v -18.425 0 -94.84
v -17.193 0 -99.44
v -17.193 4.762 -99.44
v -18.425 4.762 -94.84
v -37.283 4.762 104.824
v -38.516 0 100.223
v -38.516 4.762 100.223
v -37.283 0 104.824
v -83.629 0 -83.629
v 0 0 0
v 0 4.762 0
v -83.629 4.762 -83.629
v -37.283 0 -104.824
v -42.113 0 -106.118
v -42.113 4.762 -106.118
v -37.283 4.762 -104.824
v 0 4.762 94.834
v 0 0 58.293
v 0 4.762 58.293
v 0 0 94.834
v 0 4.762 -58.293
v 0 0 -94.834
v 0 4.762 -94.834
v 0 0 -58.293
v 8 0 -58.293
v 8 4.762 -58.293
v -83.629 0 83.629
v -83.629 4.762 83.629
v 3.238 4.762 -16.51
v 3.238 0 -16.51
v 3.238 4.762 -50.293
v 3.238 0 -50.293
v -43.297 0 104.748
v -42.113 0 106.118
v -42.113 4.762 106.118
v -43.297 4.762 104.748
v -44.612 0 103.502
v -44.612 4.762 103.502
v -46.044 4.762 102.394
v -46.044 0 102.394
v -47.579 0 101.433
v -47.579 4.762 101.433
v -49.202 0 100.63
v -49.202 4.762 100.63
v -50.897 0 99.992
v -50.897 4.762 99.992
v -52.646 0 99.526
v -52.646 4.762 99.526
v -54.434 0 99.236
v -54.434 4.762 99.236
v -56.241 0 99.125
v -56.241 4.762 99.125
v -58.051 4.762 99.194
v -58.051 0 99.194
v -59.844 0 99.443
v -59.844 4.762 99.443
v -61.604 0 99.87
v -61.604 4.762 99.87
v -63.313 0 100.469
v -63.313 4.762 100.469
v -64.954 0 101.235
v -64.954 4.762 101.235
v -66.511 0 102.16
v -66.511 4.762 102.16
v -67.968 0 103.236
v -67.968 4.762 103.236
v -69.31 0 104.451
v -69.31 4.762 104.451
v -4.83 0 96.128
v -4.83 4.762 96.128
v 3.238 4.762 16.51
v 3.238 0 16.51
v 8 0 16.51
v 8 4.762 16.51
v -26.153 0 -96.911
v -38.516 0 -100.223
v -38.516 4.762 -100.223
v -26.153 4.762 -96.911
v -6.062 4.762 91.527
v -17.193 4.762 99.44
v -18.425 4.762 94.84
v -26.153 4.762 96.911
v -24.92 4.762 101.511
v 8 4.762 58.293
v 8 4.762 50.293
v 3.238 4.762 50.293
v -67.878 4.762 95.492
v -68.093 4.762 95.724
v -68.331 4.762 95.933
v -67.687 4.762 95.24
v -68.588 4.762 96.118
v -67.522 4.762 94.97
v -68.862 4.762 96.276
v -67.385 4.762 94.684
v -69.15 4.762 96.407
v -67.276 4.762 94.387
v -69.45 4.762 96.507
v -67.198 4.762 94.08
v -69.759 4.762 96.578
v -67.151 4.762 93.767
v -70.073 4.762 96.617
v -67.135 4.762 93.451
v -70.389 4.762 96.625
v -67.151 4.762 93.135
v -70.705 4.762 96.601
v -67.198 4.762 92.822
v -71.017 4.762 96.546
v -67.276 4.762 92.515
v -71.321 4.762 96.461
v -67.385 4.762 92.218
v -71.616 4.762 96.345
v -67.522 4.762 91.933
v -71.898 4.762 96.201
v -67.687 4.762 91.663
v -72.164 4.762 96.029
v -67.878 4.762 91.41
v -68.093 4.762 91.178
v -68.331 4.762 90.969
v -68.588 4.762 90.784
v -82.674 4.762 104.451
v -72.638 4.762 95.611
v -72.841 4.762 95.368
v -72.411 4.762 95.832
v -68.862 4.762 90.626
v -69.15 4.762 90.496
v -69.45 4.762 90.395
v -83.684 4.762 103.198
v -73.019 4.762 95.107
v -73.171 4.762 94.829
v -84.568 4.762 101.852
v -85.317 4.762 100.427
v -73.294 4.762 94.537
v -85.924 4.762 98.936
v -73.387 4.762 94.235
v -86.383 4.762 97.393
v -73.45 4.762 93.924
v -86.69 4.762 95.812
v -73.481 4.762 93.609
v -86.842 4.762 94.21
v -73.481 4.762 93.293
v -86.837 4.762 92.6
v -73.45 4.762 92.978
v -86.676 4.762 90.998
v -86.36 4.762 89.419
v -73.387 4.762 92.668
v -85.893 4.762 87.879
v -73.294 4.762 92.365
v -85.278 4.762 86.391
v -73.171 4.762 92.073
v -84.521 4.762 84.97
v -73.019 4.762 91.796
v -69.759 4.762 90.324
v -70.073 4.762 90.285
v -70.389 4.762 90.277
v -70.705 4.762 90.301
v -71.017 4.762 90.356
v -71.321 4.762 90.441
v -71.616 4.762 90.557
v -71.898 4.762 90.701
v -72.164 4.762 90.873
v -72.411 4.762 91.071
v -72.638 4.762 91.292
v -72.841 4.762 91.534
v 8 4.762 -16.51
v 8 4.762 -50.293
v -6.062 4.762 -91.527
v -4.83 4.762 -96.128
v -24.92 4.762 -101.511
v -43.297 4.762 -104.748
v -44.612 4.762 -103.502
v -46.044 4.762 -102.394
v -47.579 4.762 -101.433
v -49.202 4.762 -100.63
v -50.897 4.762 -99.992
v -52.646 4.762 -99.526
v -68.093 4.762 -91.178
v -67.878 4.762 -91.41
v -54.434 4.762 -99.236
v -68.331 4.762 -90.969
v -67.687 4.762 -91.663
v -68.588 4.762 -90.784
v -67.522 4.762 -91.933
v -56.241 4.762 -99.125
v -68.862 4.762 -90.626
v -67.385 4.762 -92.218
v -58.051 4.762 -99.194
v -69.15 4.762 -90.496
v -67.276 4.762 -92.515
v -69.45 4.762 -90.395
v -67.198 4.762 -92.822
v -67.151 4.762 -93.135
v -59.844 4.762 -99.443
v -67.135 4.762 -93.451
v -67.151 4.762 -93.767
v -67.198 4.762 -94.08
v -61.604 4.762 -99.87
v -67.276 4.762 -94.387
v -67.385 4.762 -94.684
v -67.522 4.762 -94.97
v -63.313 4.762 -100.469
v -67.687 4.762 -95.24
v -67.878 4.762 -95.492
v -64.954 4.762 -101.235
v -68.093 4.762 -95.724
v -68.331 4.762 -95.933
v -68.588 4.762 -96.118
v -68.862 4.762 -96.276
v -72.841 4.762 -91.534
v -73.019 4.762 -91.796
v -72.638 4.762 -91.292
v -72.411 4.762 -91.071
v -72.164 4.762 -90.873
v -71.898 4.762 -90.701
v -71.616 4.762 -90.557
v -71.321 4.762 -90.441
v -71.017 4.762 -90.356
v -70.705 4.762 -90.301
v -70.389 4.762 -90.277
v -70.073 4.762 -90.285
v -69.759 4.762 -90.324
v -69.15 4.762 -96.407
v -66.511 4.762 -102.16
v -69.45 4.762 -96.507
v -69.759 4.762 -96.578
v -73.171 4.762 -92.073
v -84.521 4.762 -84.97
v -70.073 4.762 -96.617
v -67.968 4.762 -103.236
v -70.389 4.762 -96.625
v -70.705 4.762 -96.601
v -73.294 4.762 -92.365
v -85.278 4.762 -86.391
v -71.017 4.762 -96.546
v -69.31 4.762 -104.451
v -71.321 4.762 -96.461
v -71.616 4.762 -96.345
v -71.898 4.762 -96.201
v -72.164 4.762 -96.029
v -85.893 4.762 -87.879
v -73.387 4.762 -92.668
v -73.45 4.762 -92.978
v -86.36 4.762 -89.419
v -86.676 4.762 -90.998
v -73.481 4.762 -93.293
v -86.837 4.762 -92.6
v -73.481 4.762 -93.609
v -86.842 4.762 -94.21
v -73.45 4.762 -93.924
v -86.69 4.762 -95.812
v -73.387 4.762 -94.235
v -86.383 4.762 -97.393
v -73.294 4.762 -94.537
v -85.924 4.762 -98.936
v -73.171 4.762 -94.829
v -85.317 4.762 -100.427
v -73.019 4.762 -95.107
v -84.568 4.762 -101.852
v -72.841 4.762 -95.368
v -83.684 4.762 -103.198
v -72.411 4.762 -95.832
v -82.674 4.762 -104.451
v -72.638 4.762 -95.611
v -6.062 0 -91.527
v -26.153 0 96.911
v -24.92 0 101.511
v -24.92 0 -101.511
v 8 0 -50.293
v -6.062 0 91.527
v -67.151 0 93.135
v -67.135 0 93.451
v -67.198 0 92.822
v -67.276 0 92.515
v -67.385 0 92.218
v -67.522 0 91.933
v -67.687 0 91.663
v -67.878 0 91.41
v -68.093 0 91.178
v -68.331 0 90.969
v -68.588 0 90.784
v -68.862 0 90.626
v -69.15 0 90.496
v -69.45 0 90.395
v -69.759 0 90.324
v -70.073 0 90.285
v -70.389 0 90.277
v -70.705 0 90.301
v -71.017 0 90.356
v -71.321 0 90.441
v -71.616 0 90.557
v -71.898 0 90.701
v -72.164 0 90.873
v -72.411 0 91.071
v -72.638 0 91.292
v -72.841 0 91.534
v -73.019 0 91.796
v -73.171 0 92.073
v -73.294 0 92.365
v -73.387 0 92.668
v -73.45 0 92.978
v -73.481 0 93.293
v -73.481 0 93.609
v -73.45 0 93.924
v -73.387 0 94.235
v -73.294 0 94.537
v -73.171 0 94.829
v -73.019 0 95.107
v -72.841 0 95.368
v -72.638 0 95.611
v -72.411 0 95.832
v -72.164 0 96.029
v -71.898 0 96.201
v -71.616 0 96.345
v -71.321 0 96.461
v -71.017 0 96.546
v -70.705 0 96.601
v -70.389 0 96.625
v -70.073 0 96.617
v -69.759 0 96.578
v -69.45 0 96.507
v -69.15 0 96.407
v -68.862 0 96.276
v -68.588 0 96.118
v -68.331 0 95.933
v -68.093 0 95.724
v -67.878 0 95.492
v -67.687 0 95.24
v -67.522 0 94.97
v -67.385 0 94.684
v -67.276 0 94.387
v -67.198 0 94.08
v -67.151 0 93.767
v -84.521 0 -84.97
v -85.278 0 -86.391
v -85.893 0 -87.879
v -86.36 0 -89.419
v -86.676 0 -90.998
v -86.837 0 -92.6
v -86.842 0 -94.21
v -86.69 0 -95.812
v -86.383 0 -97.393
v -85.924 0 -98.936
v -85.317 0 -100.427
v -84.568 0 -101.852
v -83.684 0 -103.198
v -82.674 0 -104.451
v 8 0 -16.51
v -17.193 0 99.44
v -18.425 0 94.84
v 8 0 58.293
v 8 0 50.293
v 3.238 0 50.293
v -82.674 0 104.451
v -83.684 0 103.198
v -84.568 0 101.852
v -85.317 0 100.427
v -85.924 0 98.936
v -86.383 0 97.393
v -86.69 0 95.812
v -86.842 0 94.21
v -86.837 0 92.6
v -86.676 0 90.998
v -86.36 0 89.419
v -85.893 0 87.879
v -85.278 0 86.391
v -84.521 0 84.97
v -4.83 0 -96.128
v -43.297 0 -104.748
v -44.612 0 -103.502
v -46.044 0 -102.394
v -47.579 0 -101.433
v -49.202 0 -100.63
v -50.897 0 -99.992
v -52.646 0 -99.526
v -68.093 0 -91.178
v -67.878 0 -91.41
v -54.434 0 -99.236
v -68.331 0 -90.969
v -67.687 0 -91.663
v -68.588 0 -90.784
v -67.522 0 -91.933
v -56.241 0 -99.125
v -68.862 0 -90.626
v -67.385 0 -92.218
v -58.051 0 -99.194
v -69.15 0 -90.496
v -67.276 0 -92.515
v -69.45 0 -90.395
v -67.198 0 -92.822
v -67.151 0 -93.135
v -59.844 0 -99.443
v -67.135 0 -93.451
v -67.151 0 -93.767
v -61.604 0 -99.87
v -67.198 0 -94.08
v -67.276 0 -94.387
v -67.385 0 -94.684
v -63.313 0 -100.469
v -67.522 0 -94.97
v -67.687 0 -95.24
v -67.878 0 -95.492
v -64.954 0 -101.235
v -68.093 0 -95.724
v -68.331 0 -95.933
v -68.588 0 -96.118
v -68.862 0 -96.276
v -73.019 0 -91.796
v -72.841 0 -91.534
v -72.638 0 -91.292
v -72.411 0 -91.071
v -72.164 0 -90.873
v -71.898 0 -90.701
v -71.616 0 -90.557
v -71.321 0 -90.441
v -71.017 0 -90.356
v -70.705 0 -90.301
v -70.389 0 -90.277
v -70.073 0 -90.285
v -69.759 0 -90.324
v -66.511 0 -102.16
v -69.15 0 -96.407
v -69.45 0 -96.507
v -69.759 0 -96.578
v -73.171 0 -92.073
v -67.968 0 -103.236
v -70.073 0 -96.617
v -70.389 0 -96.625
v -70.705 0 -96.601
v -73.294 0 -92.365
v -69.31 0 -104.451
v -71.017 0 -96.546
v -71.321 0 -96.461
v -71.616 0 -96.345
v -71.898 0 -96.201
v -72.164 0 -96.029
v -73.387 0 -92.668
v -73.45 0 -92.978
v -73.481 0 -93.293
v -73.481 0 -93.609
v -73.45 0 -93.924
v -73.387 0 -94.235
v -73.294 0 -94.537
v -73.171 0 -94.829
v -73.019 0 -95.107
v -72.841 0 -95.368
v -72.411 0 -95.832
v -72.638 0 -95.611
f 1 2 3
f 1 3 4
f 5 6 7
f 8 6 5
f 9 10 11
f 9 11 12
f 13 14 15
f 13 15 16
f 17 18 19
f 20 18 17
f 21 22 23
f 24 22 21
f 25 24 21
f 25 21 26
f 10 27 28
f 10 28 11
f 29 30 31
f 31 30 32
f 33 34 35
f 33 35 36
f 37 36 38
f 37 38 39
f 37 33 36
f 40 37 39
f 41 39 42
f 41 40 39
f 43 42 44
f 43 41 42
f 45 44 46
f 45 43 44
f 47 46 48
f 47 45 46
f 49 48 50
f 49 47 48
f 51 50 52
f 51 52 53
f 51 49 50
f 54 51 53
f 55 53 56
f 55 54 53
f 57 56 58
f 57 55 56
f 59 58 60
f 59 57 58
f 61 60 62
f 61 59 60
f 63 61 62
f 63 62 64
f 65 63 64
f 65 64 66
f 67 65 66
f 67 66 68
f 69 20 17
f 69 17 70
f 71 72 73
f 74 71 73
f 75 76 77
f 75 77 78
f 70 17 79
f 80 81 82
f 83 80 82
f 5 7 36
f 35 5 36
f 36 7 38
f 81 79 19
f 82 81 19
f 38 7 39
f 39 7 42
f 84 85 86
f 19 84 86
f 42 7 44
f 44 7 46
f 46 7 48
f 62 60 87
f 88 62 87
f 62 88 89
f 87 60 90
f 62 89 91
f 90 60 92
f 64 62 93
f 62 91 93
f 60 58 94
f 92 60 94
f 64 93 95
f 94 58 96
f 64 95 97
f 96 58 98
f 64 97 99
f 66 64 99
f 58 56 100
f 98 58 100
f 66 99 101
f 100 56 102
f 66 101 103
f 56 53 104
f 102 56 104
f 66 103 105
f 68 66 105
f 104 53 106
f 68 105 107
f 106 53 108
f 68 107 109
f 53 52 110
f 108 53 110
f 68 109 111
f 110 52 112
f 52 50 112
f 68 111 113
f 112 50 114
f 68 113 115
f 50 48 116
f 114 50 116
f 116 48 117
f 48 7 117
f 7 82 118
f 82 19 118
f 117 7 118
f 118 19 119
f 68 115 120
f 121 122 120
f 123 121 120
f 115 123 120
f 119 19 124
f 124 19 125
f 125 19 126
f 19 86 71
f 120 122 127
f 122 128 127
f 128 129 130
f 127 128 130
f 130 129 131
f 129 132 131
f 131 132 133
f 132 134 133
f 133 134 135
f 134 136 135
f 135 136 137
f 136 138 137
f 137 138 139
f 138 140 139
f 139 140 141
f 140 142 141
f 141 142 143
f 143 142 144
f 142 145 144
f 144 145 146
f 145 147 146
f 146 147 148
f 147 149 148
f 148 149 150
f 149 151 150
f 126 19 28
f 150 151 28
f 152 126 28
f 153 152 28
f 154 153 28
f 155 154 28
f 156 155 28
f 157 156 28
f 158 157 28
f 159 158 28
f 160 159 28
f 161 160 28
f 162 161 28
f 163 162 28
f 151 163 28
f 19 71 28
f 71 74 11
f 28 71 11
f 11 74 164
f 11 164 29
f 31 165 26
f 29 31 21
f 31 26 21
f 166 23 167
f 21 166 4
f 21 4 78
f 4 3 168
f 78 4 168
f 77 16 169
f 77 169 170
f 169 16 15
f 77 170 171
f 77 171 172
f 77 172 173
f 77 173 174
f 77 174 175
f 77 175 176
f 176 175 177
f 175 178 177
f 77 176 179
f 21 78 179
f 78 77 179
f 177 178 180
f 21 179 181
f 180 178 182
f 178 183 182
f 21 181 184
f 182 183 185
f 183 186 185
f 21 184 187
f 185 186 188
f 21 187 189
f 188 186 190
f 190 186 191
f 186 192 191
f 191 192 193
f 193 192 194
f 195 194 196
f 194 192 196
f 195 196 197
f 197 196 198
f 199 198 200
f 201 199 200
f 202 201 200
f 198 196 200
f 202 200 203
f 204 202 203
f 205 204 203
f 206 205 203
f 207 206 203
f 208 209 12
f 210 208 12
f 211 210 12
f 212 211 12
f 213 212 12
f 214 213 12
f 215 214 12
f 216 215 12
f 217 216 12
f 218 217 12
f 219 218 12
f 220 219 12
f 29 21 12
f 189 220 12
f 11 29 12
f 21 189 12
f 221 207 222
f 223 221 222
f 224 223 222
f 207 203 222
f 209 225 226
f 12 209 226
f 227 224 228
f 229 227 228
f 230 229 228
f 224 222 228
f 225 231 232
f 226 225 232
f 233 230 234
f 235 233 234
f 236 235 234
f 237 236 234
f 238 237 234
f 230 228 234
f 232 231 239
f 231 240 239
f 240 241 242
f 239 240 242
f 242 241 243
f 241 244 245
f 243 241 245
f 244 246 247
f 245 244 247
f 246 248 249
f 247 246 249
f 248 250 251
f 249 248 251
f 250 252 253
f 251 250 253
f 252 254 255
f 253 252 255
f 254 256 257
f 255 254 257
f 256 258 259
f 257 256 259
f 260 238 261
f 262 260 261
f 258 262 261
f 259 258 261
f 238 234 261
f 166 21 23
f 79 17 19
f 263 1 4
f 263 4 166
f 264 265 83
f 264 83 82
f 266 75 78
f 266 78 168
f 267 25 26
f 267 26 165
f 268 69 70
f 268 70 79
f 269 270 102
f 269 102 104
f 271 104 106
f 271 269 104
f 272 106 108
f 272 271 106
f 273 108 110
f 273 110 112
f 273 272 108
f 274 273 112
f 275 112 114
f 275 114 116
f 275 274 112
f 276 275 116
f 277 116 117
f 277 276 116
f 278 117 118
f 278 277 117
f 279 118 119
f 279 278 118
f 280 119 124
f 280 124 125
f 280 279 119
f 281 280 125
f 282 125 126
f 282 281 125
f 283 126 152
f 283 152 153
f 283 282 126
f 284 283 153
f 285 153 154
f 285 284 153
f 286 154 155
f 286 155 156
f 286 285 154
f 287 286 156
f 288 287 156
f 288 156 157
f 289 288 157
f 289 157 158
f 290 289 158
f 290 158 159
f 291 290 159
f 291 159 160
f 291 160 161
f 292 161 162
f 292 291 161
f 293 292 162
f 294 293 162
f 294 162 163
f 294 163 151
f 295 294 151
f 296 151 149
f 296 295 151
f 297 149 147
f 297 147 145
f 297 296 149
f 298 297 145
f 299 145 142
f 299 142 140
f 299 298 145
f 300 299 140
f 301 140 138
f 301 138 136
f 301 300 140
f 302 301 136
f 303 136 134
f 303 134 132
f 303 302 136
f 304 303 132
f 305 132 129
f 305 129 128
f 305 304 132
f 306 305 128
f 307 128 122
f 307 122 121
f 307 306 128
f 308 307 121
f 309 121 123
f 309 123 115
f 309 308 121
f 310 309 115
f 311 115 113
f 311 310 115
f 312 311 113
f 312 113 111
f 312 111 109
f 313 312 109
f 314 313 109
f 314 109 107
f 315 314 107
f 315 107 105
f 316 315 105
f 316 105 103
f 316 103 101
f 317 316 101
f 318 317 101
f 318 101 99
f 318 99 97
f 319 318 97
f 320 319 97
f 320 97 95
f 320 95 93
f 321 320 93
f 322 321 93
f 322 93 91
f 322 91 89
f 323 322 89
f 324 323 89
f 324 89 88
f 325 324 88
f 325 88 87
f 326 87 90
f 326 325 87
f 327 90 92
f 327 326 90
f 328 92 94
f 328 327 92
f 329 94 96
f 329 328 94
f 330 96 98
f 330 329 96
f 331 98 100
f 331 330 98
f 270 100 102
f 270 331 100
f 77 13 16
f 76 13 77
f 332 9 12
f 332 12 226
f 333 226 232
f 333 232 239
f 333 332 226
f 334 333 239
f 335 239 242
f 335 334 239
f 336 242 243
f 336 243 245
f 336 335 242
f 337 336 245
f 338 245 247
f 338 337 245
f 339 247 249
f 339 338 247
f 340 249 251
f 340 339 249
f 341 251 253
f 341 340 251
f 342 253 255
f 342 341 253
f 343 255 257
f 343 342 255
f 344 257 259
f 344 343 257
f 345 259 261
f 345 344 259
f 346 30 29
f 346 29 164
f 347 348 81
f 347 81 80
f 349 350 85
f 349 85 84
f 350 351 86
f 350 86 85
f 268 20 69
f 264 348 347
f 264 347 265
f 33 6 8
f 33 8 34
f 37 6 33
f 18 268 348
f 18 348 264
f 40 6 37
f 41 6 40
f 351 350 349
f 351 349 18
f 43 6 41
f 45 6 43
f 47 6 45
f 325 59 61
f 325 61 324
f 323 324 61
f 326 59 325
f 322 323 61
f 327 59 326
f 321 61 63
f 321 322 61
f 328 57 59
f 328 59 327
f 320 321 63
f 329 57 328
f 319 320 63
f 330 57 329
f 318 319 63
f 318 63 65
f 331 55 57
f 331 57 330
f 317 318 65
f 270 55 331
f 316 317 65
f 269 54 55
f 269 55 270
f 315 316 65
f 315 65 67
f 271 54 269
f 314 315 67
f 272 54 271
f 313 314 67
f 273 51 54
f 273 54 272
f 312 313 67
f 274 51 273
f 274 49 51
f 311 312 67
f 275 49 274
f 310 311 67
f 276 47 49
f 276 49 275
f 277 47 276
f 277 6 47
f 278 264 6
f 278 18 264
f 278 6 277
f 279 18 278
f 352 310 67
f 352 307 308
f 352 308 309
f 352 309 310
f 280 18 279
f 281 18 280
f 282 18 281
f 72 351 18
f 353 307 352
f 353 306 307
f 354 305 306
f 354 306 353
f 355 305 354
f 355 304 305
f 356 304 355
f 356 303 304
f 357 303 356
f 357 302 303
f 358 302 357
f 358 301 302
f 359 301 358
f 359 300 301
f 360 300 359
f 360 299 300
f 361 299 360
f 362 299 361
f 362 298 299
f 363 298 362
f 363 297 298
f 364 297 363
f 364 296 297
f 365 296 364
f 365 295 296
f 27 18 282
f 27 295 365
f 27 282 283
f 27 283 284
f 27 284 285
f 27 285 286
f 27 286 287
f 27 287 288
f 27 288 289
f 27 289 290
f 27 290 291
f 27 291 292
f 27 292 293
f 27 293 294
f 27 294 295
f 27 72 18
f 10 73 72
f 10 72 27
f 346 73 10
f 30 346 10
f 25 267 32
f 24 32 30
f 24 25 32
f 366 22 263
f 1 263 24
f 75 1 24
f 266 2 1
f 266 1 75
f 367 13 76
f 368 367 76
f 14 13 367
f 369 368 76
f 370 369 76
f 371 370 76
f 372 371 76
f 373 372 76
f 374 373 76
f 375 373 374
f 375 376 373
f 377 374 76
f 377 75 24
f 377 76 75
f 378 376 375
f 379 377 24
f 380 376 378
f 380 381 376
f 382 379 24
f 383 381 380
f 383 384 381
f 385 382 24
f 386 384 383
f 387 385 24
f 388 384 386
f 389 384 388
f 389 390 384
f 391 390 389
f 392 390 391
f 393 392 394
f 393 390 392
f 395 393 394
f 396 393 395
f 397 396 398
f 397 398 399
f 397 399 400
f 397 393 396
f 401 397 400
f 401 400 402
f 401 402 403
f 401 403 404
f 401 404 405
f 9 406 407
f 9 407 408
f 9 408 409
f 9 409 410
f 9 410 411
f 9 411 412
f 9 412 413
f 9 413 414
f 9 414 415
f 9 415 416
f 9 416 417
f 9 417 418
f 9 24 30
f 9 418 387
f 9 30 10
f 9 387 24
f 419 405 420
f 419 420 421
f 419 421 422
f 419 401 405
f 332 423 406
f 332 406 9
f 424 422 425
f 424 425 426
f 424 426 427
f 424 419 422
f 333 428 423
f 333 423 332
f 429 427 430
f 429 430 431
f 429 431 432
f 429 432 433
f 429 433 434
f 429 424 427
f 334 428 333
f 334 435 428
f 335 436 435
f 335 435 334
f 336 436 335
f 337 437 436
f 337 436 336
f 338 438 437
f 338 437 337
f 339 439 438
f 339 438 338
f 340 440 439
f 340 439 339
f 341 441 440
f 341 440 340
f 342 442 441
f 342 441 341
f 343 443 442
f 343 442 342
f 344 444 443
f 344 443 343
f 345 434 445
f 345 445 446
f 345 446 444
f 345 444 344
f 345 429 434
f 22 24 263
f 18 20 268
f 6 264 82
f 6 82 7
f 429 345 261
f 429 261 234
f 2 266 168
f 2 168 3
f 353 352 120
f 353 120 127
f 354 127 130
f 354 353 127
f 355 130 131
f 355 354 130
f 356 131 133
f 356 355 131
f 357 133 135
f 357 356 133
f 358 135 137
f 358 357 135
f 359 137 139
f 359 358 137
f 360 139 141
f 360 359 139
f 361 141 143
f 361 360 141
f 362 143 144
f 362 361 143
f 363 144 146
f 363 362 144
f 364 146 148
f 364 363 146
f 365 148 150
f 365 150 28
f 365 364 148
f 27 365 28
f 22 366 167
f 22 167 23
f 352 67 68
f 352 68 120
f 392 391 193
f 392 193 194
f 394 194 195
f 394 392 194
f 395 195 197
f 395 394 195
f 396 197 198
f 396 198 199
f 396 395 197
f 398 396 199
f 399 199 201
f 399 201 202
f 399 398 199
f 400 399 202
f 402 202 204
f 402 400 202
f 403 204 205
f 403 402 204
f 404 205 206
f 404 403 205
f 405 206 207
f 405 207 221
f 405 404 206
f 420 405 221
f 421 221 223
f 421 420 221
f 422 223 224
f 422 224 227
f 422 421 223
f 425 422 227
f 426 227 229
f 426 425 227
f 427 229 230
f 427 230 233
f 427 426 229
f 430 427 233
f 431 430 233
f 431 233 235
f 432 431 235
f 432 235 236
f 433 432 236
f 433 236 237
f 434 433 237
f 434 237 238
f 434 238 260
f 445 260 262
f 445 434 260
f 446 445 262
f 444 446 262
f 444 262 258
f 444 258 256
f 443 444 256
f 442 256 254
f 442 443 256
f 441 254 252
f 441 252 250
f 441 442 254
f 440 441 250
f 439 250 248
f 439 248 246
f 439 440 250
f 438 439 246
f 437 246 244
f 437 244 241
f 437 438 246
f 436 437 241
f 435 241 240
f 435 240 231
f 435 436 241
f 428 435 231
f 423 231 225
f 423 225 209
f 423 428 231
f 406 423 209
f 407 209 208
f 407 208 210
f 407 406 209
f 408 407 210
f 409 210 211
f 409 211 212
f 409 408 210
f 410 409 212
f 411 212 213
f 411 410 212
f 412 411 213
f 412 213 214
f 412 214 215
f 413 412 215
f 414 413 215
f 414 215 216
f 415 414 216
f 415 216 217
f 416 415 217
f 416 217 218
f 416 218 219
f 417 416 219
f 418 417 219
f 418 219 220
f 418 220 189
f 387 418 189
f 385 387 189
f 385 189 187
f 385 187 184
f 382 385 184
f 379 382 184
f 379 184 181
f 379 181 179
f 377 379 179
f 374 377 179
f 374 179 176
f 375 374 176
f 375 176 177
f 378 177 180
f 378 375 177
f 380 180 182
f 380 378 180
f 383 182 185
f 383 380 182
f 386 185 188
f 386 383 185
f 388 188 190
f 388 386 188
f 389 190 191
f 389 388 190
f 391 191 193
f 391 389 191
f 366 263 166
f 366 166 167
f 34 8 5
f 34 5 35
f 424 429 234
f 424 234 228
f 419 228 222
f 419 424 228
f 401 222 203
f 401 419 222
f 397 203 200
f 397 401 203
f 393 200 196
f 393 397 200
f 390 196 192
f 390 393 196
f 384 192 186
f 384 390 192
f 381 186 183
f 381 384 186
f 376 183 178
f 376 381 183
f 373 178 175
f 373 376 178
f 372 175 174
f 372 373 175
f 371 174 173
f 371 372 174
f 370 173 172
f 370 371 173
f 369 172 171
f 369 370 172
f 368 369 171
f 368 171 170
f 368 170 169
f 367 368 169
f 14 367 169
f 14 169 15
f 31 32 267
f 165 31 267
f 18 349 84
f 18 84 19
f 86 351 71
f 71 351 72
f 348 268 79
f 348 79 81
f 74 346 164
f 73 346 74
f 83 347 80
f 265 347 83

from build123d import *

# Parameters (mm, degrees)
SKETCH1_R           = 3.175
BOSS_EXTRUDE1_DEPTH = 4.7625
SKETCH2_W           = 4.7625
SKETCH2_H           = 33.783
CUT_EXTRUDE1_DEPTH  = 5


with BuildPart() as part:
    # Sketch1 → Boss-Extrude1 (new body)
    with BuildSketch(Plane(origin=(0, 0, 0), x_dir=(1, 0, 0), z_dir=(0, 1, 0))):
        with BuildLine():
            Line((-82.674132744, 104.451069294), (-69.310188895, 104.451069294))
            ThreePointArc((-69.310188895, 104.451069294), (-55.336180049, 99.157726681), (-42.113057451, 106.117714323))
            Line((-42.113057451, 106.117714323), (0, 94.833554589))
            Line((0, 94.833554589), (0, 58.293))
            Line((0, 58.293), (8, 58.293))
            Line((8, 58.293), (8, -58.293))
            Line((8, -58.293), (0, -58.293))
            Line((0, -58.293), (0, -94.833554589))
            Line((0, -94.833554589), (-42.113057451, -106.117714323))
            ThreePointArc((-42.113057451, -106.117714323), (-55.336180049, -99.157726681), (-69.310188895, -104.451069294))
            Line((-69.310188895, -104.451069294), (-82.674132744, -104.451069294))
            ThreePointArc((-82.674132744, -104.451069294), (-86.841727728, -94.209575285), (-83.629476528, -83.629476528))
            Line((-83.629476528, -83.629476528), (0, 0))
            Line((0, 0), (-83.629476528, 83.629476528))
            ThreePointArc((-83.629476528, 83.629476528), (-86.841727728, 94.209575285), (-82.674132744, 104.451069294))
        make_face()
        with Locations((-70.310188895, 93.451069294)):
            Circle(SKETCH1_R, mode=Mode.SUBTRACT)
        with Locations((-70.310188895, -93.451069294)):
            Circle(SKETCH1_R, mode=Mode.SUBTRACT)
    extrude(amount=BOSS_EXTRUDE1_DEPTH)

    # Sketch2 → Cut-Extrude1 (cut)
    with BuildSketch(Plane(origin=(0, 0, 0), x_dir=(1, 0, 0), z_dir=(0, 1, 0))):
        Polygon((-17.19282542, -99.440358276), (-4.829629131, -96.127649814), (-6.062254834, -91.527428067), (-18.425451123, -94.840136528), align=None)
        Polygon((-37.283428319, -104.823619098), (-24.920232031, -101.510910637), (-26.152857733, -96.910688889), (-38.516054022, -100.22339735), align=None)
        with Locations((5.61875, -33.4015)):
            Rectangle(SKETCH2_W, SKETCH2_H)
        Polygon((-38.516054022, 100.22339735), (-26.152857733, 96.910688889), (-24.920232031, 101.510910637), (-37.283428319, 104.823619098), align=None)
        Polygon((-18.425451123, 94.840136528), (-6.062254834, 91.527428067), (-4.829629131, 96.127649814), (-17.19282542, 99.440358276), align=None)
        with Locations((5.61875, 33.4015)):
            Rectangle(SKETCH2_W, SKETCH2_H)
    extrude(amount=CUT_EXTRUDE1_DEPTH, mode=Mode.SUBTRACT)


solid = part.part
